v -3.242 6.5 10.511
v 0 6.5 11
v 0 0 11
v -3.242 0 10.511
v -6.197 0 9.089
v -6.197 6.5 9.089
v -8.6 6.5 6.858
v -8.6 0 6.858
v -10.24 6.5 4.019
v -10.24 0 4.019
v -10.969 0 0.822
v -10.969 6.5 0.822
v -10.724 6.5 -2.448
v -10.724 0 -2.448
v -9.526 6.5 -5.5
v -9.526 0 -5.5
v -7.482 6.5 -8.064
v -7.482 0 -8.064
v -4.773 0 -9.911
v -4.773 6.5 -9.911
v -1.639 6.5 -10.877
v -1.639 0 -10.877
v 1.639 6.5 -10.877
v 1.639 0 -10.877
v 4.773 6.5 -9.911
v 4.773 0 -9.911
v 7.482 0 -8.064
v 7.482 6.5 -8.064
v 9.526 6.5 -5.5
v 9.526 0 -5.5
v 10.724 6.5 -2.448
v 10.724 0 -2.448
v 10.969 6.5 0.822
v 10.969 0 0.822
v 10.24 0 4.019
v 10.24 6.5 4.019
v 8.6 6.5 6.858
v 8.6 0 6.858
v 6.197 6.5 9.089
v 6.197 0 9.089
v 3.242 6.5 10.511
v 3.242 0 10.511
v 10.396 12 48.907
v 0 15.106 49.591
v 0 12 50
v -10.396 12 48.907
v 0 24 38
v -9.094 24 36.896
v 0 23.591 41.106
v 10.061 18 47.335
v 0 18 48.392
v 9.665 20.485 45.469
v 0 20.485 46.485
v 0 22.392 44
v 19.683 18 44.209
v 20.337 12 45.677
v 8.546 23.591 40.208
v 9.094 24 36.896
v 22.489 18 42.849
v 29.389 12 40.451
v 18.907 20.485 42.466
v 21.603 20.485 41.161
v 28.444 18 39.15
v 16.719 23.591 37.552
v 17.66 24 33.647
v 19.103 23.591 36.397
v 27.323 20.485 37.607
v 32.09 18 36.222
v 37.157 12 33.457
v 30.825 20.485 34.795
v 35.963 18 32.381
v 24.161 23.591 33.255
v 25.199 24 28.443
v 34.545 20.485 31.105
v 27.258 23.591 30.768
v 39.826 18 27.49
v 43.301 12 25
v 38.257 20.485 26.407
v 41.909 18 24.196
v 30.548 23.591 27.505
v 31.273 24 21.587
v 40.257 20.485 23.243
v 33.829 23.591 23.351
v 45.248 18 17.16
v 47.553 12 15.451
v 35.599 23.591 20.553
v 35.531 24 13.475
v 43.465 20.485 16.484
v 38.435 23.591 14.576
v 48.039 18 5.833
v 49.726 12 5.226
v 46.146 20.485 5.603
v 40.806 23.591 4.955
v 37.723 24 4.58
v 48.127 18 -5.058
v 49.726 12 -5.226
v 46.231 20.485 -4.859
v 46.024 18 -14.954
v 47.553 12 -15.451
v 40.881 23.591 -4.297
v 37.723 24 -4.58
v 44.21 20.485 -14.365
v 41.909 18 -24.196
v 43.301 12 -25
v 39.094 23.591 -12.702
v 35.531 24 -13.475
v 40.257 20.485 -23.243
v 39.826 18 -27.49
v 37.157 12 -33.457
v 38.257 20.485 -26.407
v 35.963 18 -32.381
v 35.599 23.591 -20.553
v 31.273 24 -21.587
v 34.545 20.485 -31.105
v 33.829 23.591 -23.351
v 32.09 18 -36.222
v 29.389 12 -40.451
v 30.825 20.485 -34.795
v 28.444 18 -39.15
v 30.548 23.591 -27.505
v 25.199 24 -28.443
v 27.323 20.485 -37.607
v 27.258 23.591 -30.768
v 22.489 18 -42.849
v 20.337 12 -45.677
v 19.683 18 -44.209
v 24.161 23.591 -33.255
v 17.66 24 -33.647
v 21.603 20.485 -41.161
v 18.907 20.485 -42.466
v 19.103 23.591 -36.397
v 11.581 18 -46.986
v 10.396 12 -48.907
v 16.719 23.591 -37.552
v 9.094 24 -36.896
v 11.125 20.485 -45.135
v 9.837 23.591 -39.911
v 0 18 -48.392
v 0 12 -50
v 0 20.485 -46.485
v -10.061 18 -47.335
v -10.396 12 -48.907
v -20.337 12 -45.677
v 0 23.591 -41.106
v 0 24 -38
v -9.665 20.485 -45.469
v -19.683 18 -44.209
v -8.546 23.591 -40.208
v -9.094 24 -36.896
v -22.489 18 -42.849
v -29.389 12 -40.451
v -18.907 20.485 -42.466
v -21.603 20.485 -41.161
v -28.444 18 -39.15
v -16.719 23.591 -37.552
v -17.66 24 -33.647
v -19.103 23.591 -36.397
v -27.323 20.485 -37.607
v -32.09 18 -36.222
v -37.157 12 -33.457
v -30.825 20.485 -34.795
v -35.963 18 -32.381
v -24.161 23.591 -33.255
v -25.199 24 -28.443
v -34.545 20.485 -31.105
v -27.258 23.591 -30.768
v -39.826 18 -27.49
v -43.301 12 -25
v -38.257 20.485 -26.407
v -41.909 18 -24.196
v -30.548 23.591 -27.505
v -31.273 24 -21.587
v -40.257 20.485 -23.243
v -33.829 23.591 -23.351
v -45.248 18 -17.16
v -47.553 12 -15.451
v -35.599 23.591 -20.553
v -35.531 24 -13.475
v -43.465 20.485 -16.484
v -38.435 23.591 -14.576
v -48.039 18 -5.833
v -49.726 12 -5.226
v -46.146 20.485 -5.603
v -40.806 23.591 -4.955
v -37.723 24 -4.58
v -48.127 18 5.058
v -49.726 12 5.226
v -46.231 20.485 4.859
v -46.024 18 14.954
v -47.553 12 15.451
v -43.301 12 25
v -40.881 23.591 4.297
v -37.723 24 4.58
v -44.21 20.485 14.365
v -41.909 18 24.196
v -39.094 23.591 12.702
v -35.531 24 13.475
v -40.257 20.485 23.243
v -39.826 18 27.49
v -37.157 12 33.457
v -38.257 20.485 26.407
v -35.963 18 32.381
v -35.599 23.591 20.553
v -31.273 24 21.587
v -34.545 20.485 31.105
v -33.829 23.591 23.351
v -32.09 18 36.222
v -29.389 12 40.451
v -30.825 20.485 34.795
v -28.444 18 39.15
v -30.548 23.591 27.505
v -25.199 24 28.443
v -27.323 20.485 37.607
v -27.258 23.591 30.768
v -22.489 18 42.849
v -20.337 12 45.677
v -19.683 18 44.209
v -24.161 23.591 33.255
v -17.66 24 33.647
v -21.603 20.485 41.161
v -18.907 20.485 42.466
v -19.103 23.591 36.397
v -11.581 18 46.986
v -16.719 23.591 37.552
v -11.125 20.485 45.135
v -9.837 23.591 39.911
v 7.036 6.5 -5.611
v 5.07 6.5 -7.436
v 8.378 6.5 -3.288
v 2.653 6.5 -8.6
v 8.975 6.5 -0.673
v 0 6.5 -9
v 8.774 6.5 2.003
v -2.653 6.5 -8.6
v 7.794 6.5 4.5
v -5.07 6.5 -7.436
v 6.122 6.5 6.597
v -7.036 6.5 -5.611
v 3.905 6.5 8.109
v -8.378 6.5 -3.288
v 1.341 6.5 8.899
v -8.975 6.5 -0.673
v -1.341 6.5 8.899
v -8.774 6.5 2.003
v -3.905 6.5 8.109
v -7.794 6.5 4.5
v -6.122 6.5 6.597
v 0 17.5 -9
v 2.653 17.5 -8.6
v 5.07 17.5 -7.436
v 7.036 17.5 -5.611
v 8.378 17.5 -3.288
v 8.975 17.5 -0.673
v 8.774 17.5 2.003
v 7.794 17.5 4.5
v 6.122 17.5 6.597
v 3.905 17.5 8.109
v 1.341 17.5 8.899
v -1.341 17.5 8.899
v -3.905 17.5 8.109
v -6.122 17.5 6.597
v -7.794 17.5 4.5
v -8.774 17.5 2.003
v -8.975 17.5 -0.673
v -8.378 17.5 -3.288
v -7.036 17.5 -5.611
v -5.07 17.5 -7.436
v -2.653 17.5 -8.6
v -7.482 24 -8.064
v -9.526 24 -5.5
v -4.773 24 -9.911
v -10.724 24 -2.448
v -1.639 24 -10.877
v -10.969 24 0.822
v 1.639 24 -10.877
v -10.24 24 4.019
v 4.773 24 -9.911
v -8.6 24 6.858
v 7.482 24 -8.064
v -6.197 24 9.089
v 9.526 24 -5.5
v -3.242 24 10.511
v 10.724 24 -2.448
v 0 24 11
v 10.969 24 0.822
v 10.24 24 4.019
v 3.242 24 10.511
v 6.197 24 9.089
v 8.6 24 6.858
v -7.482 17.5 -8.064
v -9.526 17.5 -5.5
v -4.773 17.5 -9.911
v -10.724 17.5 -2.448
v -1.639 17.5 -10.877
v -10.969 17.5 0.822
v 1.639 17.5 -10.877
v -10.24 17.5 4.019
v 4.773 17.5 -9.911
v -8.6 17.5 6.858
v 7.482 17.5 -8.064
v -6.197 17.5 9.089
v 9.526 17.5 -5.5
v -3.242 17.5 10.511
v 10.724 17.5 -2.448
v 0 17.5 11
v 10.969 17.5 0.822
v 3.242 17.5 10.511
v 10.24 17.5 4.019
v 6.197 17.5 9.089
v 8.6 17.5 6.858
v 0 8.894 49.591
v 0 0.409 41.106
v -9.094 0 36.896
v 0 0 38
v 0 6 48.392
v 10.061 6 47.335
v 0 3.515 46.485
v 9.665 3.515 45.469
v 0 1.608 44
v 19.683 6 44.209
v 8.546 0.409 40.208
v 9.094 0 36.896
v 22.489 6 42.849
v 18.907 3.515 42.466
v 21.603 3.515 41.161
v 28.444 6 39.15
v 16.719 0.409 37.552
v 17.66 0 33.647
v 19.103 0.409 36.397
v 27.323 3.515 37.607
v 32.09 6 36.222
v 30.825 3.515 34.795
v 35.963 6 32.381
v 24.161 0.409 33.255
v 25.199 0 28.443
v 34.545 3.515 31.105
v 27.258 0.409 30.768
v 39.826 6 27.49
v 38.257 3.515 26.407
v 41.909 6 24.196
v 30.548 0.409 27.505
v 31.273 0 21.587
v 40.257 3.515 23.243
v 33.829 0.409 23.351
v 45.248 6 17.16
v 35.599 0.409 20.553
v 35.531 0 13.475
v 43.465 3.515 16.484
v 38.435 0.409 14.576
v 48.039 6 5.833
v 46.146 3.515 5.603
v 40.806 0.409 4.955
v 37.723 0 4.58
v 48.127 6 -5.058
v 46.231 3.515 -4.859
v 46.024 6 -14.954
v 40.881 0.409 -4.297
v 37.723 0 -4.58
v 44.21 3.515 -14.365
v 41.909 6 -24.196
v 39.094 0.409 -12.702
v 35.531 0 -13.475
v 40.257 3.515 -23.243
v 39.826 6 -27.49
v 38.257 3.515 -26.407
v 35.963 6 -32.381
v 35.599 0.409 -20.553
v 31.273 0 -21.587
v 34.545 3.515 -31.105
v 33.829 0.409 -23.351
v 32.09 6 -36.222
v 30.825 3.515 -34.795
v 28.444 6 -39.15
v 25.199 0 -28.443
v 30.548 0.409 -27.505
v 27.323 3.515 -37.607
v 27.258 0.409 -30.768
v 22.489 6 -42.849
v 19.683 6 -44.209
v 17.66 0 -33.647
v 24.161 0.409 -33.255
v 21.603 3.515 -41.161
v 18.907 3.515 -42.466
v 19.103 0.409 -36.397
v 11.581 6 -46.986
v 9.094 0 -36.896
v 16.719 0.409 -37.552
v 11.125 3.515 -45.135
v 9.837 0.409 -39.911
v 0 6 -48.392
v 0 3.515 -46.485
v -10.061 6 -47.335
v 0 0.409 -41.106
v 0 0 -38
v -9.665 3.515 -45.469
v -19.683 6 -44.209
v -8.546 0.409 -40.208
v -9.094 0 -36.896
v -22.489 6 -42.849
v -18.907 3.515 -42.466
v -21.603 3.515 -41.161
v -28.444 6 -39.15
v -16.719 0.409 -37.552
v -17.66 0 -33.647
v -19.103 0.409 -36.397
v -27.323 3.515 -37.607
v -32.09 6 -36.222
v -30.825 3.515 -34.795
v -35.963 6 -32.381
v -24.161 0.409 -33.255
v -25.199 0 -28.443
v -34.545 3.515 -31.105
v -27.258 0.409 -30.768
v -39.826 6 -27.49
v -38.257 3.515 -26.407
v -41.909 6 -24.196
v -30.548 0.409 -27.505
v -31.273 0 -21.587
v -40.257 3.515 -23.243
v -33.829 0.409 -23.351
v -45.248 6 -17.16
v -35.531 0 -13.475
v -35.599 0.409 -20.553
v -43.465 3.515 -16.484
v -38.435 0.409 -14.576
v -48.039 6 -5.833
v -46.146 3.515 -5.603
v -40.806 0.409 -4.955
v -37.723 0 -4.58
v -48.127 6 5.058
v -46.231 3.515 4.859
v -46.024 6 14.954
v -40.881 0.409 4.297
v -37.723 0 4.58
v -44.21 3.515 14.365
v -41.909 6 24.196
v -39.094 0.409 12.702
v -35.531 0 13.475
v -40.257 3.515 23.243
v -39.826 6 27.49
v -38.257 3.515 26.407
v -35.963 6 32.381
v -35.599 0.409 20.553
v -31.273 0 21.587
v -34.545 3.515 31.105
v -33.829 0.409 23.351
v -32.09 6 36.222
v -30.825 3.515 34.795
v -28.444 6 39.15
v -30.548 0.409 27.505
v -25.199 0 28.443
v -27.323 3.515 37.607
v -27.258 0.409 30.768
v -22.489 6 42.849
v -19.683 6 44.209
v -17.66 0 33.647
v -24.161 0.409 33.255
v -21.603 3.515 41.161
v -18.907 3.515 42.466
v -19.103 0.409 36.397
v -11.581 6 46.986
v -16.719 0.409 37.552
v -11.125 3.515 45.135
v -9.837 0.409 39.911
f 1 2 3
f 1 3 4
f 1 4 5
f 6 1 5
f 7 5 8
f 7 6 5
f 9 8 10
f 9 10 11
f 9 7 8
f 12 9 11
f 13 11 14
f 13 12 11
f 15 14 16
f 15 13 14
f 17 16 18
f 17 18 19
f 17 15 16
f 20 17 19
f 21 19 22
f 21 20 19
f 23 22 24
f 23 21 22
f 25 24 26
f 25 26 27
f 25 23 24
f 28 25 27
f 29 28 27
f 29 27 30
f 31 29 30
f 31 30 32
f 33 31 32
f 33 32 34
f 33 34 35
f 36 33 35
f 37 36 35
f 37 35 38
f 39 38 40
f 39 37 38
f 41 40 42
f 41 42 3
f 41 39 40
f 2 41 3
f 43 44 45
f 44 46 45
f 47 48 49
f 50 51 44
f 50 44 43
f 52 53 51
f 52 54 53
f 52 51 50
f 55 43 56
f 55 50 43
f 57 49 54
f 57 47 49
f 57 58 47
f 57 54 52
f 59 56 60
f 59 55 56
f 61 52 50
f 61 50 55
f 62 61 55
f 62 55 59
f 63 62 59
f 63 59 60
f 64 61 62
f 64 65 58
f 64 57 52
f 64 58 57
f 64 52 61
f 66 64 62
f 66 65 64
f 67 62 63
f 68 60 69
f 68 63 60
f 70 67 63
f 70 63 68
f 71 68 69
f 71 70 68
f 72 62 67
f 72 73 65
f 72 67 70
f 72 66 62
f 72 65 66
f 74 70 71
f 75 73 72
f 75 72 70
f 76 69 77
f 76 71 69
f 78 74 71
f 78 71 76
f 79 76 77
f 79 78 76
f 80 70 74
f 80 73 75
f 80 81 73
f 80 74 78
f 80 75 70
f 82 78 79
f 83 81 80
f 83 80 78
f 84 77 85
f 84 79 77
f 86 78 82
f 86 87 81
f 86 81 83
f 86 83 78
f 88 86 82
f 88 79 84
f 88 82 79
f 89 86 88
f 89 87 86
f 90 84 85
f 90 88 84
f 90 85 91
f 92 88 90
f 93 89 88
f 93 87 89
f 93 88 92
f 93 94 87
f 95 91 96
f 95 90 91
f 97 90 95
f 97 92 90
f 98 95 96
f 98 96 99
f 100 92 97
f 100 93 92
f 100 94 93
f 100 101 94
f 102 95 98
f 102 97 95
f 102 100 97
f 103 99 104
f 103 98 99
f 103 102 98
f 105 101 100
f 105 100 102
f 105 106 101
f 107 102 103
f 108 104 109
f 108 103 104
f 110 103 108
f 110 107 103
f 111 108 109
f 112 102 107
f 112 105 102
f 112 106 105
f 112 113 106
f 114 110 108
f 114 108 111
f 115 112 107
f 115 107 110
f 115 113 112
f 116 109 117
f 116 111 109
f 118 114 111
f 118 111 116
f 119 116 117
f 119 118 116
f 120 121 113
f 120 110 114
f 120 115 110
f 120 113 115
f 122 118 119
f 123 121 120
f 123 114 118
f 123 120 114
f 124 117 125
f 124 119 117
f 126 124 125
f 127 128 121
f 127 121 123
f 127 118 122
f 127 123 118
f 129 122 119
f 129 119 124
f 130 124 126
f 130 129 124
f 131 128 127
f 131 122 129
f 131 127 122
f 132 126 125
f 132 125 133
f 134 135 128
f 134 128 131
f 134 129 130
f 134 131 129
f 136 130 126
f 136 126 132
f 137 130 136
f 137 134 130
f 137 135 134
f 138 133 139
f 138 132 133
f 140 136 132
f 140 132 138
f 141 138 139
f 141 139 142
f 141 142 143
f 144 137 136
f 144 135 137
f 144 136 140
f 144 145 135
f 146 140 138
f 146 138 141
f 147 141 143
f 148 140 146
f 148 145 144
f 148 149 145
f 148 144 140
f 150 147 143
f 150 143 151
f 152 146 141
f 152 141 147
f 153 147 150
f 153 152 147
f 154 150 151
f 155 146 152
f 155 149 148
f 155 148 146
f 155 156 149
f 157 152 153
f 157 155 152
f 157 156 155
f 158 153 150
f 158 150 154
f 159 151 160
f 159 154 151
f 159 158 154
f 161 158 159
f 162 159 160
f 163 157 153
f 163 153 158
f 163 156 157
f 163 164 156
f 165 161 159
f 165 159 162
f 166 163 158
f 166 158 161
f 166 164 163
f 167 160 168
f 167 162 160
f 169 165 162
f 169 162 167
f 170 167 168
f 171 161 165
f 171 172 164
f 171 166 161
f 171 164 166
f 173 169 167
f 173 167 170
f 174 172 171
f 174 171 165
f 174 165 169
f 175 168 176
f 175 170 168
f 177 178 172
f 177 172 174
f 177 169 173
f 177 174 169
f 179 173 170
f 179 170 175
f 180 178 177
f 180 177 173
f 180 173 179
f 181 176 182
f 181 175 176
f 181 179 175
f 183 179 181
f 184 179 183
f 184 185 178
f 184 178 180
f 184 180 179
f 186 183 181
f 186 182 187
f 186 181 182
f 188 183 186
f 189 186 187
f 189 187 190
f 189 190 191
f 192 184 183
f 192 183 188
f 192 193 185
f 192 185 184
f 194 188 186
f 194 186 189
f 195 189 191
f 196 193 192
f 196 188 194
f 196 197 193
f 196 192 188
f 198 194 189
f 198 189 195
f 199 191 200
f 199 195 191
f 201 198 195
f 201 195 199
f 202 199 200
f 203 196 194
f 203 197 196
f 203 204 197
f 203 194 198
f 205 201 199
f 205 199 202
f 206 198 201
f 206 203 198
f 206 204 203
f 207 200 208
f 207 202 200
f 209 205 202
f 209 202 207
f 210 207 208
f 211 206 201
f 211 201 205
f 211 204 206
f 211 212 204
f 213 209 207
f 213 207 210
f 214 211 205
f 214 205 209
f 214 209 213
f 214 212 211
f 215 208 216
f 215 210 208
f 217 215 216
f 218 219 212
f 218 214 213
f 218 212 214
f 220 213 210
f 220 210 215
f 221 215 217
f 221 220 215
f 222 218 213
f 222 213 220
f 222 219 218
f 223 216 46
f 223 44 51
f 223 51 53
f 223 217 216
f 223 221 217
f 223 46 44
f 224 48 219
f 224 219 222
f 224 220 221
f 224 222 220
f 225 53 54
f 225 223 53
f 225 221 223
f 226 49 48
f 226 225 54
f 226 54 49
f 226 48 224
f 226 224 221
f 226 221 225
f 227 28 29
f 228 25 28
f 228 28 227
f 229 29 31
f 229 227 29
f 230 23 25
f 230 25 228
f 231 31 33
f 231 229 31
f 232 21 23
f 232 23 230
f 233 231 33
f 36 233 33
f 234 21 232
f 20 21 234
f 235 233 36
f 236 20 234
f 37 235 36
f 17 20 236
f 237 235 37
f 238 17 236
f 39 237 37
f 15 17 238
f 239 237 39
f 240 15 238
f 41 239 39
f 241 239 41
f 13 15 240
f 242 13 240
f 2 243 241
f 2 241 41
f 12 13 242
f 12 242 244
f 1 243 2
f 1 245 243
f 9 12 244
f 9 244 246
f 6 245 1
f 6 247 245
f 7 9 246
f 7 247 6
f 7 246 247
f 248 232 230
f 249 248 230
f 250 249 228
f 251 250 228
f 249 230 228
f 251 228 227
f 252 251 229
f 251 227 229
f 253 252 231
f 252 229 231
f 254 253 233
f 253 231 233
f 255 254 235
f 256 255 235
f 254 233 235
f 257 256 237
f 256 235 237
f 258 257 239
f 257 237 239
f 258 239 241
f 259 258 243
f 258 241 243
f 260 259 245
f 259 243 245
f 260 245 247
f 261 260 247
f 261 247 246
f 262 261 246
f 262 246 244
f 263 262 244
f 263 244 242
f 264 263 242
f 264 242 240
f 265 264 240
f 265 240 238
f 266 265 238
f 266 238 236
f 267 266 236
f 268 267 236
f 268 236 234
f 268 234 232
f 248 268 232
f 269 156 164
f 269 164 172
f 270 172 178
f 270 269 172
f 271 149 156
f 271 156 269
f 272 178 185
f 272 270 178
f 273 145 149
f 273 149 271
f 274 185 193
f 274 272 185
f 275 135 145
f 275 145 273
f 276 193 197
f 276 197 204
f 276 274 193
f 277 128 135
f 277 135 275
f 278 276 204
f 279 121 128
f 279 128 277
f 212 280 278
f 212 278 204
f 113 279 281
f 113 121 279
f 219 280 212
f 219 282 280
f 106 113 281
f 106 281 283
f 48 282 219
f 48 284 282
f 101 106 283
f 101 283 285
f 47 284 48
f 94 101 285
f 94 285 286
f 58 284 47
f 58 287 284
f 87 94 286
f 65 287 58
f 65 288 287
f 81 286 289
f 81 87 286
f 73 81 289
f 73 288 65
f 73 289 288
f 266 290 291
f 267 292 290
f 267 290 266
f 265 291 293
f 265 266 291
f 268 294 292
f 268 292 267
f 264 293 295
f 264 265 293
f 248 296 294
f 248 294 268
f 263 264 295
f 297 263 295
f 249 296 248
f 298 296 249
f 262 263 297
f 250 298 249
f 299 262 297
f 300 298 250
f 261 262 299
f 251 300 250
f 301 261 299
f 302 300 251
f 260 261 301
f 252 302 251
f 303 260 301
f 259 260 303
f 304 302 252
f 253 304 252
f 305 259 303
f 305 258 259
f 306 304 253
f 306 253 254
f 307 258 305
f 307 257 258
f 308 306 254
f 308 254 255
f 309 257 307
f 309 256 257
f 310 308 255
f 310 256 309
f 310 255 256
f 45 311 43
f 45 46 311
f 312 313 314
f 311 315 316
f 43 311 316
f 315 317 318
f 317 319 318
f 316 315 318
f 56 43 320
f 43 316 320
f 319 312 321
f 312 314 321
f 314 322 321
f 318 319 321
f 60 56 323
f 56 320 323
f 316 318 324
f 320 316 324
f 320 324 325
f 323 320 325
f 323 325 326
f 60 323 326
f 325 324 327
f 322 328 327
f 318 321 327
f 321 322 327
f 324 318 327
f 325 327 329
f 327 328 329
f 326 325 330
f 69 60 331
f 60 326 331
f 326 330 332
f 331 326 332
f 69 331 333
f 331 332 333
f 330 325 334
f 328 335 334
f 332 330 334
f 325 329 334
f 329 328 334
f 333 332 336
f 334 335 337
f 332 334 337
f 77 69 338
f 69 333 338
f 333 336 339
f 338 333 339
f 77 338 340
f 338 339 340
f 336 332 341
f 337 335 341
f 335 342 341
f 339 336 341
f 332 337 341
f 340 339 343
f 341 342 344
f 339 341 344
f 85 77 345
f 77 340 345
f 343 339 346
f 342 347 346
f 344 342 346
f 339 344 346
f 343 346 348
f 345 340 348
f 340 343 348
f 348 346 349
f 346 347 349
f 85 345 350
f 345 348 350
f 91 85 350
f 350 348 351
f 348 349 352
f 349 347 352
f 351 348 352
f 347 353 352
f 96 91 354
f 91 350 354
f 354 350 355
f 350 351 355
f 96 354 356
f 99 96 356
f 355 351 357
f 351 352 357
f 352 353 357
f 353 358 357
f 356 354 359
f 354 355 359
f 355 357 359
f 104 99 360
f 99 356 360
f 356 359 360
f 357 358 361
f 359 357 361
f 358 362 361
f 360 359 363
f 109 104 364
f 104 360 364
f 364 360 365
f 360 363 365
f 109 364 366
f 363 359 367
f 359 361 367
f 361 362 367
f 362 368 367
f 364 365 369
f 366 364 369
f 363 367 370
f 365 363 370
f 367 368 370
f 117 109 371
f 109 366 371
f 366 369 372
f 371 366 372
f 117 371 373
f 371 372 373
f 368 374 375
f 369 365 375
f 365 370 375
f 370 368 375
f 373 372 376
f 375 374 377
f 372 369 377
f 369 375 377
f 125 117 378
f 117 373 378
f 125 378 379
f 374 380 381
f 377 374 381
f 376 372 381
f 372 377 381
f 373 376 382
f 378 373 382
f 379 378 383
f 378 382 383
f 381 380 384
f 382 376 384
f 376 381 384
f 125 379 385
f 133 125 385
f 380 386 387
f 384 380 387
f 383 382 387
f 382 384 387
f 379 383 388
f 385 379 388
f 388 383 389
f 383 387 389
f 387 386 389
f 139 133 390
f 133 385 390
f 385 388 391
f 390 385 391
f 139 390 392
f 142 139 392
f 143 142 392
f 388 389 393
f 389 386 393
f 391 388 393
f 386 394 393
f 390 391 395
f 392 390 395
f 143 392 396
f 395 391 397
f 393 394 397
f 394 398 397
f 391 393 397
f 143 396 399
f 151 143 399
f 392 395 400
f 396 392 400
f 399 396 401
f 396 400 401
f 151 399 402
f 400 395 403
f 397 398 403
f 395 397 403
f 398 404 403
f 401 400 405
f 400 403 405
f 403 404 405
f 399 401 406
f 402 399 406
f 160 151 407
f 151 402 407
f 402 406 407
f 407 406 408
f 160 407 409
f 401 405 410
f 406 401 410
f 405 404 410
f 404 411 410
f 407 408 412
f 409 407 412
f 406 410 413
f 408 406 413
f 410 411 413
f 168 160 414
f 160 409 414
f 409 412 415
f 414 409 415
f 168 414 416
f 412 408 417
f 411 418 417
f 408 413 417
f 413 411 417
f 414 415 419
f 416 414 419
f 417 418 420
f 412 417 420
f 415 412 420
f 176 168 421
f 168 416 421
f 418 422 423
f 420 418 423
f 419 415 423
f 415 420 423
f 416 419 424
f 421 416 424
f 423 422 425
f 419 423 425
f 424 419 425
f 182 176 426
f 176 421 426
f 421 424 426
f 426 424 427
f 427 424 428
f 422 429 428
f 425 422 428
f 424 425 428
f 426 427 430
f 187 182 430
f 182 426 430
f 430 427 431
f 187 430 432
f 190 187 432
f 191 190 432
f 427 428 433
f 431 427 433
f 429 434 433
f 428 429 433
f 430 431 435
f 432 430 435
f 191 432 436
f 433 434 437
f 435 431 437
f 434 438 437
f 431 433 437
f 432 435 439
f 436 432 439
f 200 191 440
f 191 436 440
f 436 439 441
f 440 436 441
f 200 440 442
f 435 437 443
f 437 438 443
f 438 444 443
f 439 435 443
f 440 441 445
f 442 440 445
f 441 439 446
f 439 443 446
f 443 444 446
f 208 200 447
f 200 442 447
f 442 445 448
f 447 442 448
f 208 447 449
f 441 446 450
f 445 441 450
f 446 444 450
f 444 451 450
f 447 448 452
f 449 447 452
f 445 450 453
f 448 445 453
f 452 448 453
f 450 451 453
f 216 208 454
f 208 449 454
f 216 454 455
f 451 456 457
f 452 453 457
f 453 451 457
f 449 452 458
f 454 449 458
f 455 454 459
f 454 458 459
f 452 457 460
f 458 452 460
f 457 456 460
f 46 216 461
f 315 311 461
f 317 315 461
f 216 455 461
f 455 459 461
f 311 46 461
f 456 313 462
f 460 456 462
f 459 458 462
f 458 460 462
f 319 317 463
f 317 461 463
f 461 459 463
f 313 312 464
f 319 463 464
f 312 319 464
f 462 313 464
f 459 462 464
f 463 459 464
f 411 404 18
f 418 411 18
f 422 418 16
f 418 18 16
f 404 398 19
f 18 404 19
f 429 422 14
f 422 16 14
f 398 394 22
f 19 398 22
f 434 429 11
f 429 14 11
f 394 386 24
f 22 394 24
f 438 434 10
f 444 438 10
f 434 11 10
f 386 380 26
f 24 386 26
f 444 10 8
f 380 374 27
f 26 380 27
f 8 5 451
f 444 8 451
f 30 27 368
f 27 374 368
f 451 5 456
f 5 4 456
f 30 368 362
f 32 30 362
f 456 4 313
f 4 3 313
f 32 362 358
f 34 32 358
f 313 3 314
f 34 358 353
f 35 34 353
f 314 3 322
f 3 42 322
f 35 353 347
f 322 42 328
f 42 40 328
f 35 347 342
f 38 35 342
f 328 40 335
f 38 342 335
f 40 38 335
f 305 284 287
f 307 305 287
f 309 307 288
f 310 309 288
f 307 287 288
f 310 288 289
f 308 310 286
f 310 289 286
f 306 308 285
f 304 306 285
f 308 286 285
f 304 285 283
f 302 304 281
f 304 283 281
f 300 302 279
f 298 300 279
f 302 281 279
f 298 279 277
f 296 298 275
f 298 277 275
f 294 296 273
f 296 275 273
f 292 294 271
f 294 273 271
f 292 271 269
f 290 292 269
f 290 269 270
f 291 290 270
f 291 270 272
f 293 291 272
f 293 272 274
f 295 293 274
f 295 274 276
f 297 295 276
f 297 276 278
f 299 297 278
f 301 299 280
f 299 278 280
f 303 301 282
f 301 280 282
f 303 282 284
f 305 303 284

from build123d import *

# Parameters (mm, degrees)
SKETCH1_R           = 50
BOSS_EXTRUDE1_DEPTH = 24
FILLET1_R           = 12
SKETCH2_R           = 11
CUT_EXTRUDE1_DEPTH  = 6.5
CUT_EXTRUDE2_START  = -6.5
SKETCH3_R           = 11
CUT_EXTRUDE2_DEPTH  = 6.5
SKETCH4_R           = 9
CUT_EXTRUDE3_DEPTH  = 73.844011422


with BuildPart() as part:
    # Sketch1 → Boss-Extrude1 (new body)
    with BuildSketch(Plane(origin=(0, 0, 0), x_dir=(1, 0, 0), z_dir=(0, 1, 0))):
        with Locations(Location((0, 0, 0), (0, 0, 270))):
            Circle(SKETCH1_R)
    extrude(amount=BOSS_EXTRUDE1_DEPTH)

    # Fillet1
    fillet1_edges = [part.edges().sort_by_distance(p)[0] for p in [
        (0, 0, -50),
        (0, 24, -50),
    ]]
    fillet(fillet1_edges, radius=FILLET1_R - 0.0001)  # a hair under: the kernel refuses the full size

    # Sketch2 → Cut-Extrude1 (cut)
    with BuildSketch(Plane(origin=(0, 24, 0), x_dir=(1, 0, 0), z_dir=(0, 1, 0))):
        with Locations(Location((0, 0, 0), (0, 0, 270))):
            Circle(SKETCH2_R)
    extrude(amount=-CUT_EXTRUDE1_DEPTH, mode=Mode.SUBTRACT)

    # Sketch3 → Cut-Extrude2 (cut)
    with BuildSketch(Plane.XZ.offset(CUT_EXTRUDE2_START)):
        with Locations(Location((0, 0, 0), (0, 0, 90))):
            Circle(SKETCH3_R)
    extrude(amount=CUT_EXTRUDE2_DEPTH, mode=Mode.SUBTRACT)

    # Sketch4 → Cut-Extrude3 (cut, through all)
    with BuildSketch(Plane.XZ.offset(-6.5)):
        with Locations(Location((0, 0, 0), (0, 0, 270))):
            Circle(SKETCH4_R)
    extrude(amount=-CUT_EXTRUDE3_DEPTH, mode=Mode.SUBTRACT)


solid = part.part
